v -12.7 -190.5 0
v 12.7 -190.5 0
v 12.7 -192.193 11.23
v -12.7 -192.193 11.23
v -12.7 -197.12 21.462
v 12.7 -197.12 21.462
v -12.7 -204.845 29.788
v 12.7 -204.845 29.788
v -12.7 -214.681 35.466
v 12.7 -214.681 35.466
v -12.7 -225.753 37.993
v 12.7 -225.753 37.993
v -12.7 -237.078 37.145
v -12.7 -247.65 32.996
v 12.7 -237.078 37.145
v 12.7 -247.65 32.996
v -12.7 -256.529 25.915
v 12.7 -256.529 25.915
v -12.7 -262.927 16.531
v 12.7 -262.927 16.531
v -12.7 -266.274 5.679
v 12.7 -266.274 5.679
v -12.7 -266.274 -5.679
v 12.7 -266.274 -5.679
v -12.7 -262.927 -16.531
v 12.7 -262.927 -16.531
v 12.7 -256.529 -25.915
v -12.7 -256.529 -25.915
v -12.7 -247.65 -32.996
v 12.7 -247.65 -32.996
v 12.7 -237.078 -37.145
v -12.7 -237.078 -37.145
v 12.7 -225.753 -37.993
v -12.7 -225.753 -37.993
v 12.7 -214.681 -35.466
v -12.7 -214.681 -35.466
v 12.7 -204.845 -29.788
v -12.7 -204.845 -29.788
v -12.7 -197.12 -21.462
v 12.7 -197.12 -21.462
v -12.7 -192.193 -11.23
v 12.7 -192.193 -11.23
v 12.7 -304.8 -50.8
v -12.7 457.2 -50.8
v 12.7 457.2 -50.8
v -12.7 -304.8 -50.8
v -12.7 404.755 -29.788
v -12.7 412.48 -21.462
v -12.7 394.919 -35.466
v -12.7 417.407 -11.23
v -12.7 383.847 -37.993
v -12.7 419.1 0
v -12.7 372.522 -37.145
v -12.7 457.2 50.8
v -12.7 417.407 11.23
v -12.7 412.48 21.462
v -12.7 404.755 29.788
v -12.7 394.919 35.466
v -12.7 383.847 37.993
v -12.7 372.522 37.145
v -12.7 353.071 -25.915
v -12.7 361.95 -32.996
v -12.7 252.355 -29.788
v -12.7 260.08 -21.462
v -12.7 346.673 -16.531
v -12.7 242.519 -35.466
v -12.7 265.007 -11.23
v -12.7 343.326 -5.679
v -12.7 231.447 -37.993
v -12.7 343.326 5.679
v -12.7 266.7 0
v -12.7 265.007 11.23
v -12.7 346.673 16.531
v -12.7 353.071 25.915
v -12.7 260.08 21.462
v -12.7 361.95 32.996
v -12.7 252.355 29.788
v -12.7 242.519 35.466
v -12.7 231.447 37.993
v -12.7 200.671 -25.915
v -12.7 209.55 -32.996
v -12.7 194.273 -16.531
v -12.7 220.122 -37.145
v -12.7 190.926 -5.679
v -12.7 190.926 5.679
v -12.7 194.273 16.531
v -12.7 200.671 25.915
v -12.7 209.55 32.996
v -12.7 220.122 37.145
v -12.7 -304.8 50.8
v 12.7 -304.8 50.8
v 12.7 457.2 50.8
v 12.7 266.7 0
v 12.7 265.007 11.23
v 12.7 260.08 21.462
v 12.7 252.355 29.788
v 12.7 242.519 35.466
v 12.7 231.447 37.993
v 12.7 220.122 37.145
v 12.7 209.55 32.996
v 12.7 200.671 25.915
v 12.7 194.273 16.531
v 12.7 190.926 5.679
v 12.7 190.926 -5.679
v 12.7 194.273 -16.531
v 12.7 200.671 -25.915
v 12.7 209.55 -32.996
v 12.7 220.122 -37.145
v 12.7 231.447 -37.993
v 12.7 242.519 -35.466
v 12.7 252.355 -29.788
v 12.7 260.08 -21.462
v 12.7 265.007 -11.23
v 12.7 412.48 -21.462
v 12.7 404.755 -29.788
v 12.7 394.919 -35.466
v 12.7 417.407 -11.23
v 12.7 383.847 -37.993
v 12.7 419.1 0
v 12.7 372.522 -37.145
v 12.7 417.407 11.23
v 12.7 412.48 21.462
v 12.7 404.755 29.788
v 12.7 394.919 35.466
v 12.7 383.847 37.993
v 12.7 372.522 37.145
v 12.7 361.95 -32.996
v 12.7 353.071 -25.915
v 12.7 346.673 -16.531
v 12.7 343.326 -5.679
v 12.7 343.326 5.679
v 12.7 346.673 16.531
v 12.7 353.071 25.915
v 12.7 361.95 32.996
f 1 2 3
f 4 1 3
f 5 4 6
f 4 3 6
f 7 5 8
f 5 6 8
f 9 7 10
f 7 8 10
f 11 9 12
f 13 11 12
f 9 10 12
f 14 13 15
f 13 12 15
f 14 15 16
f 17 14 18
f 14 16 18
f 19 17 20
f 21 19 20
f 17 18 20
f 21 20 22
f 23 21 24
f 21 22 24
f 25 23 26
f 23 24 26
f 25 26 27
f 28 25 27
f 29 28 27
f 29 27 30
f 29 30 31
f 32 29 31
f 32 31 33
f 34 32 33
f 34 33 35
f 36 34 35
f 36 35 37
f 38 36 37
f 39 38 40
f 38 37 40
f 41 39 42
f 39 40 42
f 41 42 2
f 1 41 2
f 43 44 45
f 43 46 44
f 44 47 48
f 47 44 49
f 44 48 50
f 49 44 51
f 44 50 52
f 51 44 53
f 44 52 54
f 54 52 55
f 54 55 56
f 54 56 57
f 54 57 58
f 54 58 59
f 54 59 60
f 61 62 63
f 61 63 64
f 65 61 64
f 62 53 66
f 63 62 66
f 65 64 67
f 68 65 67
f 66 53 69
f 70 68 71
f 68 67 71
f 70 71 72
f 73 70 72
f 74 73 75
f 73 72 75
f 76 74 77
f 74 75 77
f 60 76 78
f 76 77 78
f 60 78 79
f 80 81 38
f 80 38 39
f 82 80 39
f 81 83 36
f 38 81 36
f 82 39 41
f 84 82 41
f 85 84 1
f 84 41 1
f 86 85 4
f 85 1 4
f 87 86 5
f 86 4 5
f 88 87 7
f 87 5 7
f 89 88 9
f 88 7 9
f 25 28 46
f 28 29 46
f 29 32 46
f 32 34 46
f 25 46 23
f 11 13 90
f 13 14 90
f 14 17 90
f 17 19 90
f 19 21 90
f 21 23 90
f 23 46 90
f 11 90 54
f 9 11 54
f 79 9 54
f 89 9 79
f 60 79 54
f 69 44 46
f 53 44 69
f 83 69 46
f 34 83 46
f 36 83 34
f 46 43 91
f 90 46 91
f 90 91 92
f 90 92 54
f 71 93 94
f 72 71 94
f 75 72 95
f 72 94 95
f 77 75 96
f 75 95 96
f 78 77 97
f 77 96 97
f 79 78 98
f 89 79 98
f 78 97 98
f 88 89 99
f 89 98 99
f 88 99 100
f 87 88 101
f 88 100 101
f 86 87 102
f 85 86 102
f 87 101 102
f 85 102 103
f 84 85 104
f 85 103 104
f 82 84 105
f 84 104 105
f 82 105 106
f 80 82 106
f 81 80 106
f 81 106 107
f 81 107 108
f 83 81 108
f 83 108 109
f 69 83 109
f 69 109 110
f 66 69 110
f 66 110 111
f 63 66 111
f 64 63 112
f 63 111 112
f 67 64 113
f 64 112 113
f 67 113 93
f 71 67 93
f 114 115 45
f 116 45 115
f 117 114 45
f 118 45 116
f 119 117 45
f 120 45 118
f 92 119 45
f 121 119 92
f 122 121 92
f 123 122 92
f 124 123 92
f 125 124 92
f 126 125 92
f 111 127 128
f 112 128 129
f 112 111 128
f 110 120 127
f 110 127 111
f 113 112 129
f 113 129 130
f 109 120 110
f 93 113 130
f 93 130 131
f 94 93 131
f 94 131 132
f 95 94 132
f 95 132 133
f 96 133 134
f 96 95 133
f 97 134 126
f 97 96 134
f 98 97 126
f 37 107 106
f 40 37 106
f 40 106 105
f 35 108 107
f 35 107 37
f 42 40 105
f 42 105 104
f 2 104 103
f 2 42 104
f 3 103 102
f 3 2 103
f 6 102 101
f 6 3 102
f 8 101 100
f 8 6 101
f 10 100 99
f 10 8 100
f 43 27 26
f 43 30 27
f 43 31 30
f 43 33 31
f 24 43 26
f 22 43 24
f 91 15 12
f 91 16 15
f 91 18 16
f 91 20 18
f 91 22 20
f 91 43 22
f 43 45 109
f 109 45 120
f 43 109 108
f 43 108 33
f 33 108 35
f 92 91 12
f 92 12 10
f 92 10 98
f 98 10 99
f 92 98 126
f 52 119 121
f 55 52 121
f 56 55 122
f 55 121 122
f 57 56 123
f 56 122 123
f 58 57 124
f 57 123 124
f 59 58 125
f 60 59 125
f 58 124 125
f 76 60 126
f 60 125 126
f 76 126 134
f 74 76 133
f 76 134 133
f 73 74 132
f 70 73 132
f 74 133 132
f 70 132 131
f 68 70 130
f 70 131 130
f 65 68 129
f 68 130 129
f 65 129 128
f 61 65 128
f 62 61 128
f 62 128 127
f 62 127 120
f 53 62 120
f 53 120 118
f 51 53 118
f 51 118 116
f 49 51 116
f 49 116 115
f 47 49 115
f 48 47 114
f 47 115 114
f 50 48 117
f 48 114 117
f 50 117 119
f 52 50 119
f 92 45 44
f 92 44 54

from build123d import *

# Parameters (mm, degrees)
F0_W     = 609.6
F0_H     = 101.6
F1_DEPTH = 12.7
F2_R     = 38.1
F3_DEPTH = 25.4
F4_DEPTH = 152.4
F5_R     = 38.1
F6_DEPTH = 25.4


with BuildPart() as f1:
    # F0 (on Right) → F1 (new body, symmetric)
    with BuildSketch(Plane.YZ):
        Rectangle(F0_W, F0_H)
    extrude(amount=F1_DEPTH, both=True)

    # F2 (on face) → F3 (cut)
    with BuildSketch(Plane.YZ.offset(12.7)):
        with Locations((-228.6, 0)):
            Circle(F2_R)
        with Locations((228.6, 0)):
            Circle(F2_R)
    extrude(amount=-F3_DEPTH, mode=Mode.SUBTRACT)

    # F4 (add): a face of the model
    f4_faces = [f1.faces().sort_by_distance(p)[0] for p in [
        (0, 304.8, 0),
    ]]
    extrude(f4_faces, amount=F4_DEPTH)

    # F5 (on face) → F6 (cut)
    with BuildSketch(Plane.YZ.offset(12.7)):
        with Locations((381, 0)):
            Circle(F5_R)
    extrude(amount=-F6_DEPTH, mode=Mode.SUBTRACT)


solid = f1.part
